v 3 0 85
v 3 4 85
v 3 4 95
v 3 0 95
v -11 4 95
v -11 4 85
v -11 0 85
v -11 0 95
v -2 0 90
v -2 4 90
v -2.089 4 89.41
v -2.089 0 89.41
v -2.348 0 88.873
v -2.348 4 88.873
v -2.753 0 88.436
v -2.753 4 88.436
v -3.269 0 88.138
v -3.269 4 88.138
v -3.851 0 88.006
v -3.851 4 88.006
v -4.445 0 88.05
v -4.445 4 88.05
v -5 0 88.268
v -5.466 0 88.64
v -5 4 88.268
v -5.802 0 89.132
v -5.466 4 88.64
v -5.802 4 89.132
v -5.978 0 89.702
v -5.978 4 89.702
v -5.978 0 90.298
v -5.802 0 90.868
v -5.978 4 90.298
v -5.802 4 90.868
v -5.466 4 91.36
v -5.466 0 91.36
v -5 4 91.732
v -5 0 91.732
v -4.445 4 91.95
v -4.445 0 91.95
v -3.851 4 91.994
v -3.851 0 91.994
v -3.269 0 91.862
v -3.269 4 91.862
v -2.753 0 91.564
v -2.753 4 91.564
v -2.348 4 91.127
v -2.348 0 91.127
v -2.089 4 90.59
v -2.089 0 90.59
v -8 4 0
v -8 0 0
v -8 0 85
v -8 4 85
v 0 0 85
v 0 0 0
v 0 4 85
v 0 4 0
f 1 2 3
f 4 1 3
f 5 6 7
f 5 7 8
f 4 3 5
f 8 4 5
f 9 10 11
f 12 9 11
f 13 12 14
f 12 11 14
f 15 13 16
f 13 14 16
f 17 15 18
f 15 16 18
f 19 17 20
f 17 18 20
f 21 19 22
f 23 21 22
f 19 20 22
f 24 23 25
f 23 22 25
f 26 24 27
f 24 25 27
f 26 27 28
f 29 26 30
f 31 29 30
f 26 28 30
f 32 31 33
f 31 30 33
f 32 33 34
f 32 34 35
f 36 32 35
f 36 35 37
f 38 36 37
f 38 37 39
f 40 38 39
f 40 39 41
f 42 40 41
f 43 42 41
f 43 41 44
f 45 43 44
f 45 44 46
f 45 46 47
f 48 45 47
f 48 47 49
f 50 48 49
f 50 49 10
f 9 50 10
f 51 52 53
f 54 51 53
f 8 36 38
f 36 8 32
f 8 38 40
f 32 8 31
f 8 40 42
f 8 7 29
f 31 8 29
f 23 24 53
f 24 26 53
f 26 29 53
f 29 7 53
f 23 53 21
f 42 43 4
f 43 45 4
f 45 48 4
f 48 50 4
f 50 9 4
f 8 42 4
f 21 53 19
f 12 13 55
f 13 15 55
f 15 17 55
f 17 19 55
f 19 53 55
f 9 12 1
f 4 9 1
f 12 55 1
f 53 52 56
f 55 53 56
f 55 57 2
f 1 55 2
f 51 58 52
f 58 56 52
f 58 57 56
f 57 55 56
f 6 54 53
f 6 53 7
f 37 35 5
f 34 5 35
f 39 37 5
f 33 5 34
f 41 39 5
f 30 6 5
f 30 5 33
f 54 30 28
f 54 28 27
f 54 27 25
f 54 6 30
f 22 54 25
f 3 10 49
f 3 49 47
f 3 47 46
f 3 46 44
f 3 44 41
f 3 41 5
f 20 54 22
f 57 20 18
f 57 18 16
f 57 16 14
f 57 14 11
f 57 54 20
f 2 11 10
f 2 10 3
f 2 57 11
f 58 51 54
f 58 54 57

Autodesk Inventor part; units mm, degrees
ref_plane "YZ Plane" through (0, 0, 0) normal (1, 0, 0) x (0, 1, 0)
ref_plane "XZ Plane" through (0, 0, 0) normal (0, 1, 0) x (-1, 0, 0)
ref_plane "XY Plane" through (0, 0, 0) normal (0, 0, 1) x (1, 0, 0)
sketch "Sketch1" plane through (0, 0, 0) normal (0, 1, 0) x (-1, 0, 0)
  line L0 (0, 0) -> (8, 0)
  line L1 (8, 0) -> (8, 85)
  line L2 (8, 85) -> (0, 85)
  line L3 (0, 85) -> (0, 0)
  dimension "d0" = 8
  dimension "d1" = 85
extrude "Extrusion1" add sketch "Sketch1" along normal blind 4
sketch "Sketch2" plane through (0, 4, 0) normal (0, 1, 0) x (1, 0, 0)
  line L0 (-8, -85) -> (0, -85) projected
  line L1 (-4, -85) -> (-11, -85)
  line L2 (-11, -85) -> (-11, -95)
  line L3 (-11, -95) -> (-4, -95)
  line L4 (-4, -95) -> (-4, -85)
  point P0 (0, 0)
  dimension "d4" = 7
  dimension "d5" = 10
extrude "Extrusion2" add sketch "Sketch2" against normal blind 4
sketch "Sketch3" plane through (0, 4, 0) normal (0, 1, 0) x (1, 0, 0)
  line L0 (-4, -85) -> (-4, -95) projected
  line L1 (-4, -85) -> (3, -85)
  line L2 (3, -85) -> (3, -95)
  line L3 (3, -95) -> (-4, -95)
  line L4 (-4, -95) -> (-4, -85)
  point P0 (0, 0)
  dimension "d8" = 7
  dimension "d9" = 10
extrude "Extrusion3" add sketch "Sketch3" against normal blind 4
sketch "Sketch5" plane through (0, 4, 0) normal (0, 1, 0) x (1, 0, 0)
  line L0 (-11, -95) -> (-11, -85) projected
  line L1 (-11, -95) -> (-4, -95)
  line L2 (-4, -95) -> (-4, -90)
  line L3 (-4, -90) -> (-11, -90)
  line L4 (-11, -90) -> (-11, -95)
  circle A0 centre (-4, -90) radius 2
  point P0 (0, 0)
  dimension "d14" = 7
  dimension "d15" = 5
  dimension "d16" = 4
extrude "Extrusion4" cut sketch "Sketch5" against normal blind 4 contours A0 L2 L3 | L3 L2 A0
properties part number "seddd"
